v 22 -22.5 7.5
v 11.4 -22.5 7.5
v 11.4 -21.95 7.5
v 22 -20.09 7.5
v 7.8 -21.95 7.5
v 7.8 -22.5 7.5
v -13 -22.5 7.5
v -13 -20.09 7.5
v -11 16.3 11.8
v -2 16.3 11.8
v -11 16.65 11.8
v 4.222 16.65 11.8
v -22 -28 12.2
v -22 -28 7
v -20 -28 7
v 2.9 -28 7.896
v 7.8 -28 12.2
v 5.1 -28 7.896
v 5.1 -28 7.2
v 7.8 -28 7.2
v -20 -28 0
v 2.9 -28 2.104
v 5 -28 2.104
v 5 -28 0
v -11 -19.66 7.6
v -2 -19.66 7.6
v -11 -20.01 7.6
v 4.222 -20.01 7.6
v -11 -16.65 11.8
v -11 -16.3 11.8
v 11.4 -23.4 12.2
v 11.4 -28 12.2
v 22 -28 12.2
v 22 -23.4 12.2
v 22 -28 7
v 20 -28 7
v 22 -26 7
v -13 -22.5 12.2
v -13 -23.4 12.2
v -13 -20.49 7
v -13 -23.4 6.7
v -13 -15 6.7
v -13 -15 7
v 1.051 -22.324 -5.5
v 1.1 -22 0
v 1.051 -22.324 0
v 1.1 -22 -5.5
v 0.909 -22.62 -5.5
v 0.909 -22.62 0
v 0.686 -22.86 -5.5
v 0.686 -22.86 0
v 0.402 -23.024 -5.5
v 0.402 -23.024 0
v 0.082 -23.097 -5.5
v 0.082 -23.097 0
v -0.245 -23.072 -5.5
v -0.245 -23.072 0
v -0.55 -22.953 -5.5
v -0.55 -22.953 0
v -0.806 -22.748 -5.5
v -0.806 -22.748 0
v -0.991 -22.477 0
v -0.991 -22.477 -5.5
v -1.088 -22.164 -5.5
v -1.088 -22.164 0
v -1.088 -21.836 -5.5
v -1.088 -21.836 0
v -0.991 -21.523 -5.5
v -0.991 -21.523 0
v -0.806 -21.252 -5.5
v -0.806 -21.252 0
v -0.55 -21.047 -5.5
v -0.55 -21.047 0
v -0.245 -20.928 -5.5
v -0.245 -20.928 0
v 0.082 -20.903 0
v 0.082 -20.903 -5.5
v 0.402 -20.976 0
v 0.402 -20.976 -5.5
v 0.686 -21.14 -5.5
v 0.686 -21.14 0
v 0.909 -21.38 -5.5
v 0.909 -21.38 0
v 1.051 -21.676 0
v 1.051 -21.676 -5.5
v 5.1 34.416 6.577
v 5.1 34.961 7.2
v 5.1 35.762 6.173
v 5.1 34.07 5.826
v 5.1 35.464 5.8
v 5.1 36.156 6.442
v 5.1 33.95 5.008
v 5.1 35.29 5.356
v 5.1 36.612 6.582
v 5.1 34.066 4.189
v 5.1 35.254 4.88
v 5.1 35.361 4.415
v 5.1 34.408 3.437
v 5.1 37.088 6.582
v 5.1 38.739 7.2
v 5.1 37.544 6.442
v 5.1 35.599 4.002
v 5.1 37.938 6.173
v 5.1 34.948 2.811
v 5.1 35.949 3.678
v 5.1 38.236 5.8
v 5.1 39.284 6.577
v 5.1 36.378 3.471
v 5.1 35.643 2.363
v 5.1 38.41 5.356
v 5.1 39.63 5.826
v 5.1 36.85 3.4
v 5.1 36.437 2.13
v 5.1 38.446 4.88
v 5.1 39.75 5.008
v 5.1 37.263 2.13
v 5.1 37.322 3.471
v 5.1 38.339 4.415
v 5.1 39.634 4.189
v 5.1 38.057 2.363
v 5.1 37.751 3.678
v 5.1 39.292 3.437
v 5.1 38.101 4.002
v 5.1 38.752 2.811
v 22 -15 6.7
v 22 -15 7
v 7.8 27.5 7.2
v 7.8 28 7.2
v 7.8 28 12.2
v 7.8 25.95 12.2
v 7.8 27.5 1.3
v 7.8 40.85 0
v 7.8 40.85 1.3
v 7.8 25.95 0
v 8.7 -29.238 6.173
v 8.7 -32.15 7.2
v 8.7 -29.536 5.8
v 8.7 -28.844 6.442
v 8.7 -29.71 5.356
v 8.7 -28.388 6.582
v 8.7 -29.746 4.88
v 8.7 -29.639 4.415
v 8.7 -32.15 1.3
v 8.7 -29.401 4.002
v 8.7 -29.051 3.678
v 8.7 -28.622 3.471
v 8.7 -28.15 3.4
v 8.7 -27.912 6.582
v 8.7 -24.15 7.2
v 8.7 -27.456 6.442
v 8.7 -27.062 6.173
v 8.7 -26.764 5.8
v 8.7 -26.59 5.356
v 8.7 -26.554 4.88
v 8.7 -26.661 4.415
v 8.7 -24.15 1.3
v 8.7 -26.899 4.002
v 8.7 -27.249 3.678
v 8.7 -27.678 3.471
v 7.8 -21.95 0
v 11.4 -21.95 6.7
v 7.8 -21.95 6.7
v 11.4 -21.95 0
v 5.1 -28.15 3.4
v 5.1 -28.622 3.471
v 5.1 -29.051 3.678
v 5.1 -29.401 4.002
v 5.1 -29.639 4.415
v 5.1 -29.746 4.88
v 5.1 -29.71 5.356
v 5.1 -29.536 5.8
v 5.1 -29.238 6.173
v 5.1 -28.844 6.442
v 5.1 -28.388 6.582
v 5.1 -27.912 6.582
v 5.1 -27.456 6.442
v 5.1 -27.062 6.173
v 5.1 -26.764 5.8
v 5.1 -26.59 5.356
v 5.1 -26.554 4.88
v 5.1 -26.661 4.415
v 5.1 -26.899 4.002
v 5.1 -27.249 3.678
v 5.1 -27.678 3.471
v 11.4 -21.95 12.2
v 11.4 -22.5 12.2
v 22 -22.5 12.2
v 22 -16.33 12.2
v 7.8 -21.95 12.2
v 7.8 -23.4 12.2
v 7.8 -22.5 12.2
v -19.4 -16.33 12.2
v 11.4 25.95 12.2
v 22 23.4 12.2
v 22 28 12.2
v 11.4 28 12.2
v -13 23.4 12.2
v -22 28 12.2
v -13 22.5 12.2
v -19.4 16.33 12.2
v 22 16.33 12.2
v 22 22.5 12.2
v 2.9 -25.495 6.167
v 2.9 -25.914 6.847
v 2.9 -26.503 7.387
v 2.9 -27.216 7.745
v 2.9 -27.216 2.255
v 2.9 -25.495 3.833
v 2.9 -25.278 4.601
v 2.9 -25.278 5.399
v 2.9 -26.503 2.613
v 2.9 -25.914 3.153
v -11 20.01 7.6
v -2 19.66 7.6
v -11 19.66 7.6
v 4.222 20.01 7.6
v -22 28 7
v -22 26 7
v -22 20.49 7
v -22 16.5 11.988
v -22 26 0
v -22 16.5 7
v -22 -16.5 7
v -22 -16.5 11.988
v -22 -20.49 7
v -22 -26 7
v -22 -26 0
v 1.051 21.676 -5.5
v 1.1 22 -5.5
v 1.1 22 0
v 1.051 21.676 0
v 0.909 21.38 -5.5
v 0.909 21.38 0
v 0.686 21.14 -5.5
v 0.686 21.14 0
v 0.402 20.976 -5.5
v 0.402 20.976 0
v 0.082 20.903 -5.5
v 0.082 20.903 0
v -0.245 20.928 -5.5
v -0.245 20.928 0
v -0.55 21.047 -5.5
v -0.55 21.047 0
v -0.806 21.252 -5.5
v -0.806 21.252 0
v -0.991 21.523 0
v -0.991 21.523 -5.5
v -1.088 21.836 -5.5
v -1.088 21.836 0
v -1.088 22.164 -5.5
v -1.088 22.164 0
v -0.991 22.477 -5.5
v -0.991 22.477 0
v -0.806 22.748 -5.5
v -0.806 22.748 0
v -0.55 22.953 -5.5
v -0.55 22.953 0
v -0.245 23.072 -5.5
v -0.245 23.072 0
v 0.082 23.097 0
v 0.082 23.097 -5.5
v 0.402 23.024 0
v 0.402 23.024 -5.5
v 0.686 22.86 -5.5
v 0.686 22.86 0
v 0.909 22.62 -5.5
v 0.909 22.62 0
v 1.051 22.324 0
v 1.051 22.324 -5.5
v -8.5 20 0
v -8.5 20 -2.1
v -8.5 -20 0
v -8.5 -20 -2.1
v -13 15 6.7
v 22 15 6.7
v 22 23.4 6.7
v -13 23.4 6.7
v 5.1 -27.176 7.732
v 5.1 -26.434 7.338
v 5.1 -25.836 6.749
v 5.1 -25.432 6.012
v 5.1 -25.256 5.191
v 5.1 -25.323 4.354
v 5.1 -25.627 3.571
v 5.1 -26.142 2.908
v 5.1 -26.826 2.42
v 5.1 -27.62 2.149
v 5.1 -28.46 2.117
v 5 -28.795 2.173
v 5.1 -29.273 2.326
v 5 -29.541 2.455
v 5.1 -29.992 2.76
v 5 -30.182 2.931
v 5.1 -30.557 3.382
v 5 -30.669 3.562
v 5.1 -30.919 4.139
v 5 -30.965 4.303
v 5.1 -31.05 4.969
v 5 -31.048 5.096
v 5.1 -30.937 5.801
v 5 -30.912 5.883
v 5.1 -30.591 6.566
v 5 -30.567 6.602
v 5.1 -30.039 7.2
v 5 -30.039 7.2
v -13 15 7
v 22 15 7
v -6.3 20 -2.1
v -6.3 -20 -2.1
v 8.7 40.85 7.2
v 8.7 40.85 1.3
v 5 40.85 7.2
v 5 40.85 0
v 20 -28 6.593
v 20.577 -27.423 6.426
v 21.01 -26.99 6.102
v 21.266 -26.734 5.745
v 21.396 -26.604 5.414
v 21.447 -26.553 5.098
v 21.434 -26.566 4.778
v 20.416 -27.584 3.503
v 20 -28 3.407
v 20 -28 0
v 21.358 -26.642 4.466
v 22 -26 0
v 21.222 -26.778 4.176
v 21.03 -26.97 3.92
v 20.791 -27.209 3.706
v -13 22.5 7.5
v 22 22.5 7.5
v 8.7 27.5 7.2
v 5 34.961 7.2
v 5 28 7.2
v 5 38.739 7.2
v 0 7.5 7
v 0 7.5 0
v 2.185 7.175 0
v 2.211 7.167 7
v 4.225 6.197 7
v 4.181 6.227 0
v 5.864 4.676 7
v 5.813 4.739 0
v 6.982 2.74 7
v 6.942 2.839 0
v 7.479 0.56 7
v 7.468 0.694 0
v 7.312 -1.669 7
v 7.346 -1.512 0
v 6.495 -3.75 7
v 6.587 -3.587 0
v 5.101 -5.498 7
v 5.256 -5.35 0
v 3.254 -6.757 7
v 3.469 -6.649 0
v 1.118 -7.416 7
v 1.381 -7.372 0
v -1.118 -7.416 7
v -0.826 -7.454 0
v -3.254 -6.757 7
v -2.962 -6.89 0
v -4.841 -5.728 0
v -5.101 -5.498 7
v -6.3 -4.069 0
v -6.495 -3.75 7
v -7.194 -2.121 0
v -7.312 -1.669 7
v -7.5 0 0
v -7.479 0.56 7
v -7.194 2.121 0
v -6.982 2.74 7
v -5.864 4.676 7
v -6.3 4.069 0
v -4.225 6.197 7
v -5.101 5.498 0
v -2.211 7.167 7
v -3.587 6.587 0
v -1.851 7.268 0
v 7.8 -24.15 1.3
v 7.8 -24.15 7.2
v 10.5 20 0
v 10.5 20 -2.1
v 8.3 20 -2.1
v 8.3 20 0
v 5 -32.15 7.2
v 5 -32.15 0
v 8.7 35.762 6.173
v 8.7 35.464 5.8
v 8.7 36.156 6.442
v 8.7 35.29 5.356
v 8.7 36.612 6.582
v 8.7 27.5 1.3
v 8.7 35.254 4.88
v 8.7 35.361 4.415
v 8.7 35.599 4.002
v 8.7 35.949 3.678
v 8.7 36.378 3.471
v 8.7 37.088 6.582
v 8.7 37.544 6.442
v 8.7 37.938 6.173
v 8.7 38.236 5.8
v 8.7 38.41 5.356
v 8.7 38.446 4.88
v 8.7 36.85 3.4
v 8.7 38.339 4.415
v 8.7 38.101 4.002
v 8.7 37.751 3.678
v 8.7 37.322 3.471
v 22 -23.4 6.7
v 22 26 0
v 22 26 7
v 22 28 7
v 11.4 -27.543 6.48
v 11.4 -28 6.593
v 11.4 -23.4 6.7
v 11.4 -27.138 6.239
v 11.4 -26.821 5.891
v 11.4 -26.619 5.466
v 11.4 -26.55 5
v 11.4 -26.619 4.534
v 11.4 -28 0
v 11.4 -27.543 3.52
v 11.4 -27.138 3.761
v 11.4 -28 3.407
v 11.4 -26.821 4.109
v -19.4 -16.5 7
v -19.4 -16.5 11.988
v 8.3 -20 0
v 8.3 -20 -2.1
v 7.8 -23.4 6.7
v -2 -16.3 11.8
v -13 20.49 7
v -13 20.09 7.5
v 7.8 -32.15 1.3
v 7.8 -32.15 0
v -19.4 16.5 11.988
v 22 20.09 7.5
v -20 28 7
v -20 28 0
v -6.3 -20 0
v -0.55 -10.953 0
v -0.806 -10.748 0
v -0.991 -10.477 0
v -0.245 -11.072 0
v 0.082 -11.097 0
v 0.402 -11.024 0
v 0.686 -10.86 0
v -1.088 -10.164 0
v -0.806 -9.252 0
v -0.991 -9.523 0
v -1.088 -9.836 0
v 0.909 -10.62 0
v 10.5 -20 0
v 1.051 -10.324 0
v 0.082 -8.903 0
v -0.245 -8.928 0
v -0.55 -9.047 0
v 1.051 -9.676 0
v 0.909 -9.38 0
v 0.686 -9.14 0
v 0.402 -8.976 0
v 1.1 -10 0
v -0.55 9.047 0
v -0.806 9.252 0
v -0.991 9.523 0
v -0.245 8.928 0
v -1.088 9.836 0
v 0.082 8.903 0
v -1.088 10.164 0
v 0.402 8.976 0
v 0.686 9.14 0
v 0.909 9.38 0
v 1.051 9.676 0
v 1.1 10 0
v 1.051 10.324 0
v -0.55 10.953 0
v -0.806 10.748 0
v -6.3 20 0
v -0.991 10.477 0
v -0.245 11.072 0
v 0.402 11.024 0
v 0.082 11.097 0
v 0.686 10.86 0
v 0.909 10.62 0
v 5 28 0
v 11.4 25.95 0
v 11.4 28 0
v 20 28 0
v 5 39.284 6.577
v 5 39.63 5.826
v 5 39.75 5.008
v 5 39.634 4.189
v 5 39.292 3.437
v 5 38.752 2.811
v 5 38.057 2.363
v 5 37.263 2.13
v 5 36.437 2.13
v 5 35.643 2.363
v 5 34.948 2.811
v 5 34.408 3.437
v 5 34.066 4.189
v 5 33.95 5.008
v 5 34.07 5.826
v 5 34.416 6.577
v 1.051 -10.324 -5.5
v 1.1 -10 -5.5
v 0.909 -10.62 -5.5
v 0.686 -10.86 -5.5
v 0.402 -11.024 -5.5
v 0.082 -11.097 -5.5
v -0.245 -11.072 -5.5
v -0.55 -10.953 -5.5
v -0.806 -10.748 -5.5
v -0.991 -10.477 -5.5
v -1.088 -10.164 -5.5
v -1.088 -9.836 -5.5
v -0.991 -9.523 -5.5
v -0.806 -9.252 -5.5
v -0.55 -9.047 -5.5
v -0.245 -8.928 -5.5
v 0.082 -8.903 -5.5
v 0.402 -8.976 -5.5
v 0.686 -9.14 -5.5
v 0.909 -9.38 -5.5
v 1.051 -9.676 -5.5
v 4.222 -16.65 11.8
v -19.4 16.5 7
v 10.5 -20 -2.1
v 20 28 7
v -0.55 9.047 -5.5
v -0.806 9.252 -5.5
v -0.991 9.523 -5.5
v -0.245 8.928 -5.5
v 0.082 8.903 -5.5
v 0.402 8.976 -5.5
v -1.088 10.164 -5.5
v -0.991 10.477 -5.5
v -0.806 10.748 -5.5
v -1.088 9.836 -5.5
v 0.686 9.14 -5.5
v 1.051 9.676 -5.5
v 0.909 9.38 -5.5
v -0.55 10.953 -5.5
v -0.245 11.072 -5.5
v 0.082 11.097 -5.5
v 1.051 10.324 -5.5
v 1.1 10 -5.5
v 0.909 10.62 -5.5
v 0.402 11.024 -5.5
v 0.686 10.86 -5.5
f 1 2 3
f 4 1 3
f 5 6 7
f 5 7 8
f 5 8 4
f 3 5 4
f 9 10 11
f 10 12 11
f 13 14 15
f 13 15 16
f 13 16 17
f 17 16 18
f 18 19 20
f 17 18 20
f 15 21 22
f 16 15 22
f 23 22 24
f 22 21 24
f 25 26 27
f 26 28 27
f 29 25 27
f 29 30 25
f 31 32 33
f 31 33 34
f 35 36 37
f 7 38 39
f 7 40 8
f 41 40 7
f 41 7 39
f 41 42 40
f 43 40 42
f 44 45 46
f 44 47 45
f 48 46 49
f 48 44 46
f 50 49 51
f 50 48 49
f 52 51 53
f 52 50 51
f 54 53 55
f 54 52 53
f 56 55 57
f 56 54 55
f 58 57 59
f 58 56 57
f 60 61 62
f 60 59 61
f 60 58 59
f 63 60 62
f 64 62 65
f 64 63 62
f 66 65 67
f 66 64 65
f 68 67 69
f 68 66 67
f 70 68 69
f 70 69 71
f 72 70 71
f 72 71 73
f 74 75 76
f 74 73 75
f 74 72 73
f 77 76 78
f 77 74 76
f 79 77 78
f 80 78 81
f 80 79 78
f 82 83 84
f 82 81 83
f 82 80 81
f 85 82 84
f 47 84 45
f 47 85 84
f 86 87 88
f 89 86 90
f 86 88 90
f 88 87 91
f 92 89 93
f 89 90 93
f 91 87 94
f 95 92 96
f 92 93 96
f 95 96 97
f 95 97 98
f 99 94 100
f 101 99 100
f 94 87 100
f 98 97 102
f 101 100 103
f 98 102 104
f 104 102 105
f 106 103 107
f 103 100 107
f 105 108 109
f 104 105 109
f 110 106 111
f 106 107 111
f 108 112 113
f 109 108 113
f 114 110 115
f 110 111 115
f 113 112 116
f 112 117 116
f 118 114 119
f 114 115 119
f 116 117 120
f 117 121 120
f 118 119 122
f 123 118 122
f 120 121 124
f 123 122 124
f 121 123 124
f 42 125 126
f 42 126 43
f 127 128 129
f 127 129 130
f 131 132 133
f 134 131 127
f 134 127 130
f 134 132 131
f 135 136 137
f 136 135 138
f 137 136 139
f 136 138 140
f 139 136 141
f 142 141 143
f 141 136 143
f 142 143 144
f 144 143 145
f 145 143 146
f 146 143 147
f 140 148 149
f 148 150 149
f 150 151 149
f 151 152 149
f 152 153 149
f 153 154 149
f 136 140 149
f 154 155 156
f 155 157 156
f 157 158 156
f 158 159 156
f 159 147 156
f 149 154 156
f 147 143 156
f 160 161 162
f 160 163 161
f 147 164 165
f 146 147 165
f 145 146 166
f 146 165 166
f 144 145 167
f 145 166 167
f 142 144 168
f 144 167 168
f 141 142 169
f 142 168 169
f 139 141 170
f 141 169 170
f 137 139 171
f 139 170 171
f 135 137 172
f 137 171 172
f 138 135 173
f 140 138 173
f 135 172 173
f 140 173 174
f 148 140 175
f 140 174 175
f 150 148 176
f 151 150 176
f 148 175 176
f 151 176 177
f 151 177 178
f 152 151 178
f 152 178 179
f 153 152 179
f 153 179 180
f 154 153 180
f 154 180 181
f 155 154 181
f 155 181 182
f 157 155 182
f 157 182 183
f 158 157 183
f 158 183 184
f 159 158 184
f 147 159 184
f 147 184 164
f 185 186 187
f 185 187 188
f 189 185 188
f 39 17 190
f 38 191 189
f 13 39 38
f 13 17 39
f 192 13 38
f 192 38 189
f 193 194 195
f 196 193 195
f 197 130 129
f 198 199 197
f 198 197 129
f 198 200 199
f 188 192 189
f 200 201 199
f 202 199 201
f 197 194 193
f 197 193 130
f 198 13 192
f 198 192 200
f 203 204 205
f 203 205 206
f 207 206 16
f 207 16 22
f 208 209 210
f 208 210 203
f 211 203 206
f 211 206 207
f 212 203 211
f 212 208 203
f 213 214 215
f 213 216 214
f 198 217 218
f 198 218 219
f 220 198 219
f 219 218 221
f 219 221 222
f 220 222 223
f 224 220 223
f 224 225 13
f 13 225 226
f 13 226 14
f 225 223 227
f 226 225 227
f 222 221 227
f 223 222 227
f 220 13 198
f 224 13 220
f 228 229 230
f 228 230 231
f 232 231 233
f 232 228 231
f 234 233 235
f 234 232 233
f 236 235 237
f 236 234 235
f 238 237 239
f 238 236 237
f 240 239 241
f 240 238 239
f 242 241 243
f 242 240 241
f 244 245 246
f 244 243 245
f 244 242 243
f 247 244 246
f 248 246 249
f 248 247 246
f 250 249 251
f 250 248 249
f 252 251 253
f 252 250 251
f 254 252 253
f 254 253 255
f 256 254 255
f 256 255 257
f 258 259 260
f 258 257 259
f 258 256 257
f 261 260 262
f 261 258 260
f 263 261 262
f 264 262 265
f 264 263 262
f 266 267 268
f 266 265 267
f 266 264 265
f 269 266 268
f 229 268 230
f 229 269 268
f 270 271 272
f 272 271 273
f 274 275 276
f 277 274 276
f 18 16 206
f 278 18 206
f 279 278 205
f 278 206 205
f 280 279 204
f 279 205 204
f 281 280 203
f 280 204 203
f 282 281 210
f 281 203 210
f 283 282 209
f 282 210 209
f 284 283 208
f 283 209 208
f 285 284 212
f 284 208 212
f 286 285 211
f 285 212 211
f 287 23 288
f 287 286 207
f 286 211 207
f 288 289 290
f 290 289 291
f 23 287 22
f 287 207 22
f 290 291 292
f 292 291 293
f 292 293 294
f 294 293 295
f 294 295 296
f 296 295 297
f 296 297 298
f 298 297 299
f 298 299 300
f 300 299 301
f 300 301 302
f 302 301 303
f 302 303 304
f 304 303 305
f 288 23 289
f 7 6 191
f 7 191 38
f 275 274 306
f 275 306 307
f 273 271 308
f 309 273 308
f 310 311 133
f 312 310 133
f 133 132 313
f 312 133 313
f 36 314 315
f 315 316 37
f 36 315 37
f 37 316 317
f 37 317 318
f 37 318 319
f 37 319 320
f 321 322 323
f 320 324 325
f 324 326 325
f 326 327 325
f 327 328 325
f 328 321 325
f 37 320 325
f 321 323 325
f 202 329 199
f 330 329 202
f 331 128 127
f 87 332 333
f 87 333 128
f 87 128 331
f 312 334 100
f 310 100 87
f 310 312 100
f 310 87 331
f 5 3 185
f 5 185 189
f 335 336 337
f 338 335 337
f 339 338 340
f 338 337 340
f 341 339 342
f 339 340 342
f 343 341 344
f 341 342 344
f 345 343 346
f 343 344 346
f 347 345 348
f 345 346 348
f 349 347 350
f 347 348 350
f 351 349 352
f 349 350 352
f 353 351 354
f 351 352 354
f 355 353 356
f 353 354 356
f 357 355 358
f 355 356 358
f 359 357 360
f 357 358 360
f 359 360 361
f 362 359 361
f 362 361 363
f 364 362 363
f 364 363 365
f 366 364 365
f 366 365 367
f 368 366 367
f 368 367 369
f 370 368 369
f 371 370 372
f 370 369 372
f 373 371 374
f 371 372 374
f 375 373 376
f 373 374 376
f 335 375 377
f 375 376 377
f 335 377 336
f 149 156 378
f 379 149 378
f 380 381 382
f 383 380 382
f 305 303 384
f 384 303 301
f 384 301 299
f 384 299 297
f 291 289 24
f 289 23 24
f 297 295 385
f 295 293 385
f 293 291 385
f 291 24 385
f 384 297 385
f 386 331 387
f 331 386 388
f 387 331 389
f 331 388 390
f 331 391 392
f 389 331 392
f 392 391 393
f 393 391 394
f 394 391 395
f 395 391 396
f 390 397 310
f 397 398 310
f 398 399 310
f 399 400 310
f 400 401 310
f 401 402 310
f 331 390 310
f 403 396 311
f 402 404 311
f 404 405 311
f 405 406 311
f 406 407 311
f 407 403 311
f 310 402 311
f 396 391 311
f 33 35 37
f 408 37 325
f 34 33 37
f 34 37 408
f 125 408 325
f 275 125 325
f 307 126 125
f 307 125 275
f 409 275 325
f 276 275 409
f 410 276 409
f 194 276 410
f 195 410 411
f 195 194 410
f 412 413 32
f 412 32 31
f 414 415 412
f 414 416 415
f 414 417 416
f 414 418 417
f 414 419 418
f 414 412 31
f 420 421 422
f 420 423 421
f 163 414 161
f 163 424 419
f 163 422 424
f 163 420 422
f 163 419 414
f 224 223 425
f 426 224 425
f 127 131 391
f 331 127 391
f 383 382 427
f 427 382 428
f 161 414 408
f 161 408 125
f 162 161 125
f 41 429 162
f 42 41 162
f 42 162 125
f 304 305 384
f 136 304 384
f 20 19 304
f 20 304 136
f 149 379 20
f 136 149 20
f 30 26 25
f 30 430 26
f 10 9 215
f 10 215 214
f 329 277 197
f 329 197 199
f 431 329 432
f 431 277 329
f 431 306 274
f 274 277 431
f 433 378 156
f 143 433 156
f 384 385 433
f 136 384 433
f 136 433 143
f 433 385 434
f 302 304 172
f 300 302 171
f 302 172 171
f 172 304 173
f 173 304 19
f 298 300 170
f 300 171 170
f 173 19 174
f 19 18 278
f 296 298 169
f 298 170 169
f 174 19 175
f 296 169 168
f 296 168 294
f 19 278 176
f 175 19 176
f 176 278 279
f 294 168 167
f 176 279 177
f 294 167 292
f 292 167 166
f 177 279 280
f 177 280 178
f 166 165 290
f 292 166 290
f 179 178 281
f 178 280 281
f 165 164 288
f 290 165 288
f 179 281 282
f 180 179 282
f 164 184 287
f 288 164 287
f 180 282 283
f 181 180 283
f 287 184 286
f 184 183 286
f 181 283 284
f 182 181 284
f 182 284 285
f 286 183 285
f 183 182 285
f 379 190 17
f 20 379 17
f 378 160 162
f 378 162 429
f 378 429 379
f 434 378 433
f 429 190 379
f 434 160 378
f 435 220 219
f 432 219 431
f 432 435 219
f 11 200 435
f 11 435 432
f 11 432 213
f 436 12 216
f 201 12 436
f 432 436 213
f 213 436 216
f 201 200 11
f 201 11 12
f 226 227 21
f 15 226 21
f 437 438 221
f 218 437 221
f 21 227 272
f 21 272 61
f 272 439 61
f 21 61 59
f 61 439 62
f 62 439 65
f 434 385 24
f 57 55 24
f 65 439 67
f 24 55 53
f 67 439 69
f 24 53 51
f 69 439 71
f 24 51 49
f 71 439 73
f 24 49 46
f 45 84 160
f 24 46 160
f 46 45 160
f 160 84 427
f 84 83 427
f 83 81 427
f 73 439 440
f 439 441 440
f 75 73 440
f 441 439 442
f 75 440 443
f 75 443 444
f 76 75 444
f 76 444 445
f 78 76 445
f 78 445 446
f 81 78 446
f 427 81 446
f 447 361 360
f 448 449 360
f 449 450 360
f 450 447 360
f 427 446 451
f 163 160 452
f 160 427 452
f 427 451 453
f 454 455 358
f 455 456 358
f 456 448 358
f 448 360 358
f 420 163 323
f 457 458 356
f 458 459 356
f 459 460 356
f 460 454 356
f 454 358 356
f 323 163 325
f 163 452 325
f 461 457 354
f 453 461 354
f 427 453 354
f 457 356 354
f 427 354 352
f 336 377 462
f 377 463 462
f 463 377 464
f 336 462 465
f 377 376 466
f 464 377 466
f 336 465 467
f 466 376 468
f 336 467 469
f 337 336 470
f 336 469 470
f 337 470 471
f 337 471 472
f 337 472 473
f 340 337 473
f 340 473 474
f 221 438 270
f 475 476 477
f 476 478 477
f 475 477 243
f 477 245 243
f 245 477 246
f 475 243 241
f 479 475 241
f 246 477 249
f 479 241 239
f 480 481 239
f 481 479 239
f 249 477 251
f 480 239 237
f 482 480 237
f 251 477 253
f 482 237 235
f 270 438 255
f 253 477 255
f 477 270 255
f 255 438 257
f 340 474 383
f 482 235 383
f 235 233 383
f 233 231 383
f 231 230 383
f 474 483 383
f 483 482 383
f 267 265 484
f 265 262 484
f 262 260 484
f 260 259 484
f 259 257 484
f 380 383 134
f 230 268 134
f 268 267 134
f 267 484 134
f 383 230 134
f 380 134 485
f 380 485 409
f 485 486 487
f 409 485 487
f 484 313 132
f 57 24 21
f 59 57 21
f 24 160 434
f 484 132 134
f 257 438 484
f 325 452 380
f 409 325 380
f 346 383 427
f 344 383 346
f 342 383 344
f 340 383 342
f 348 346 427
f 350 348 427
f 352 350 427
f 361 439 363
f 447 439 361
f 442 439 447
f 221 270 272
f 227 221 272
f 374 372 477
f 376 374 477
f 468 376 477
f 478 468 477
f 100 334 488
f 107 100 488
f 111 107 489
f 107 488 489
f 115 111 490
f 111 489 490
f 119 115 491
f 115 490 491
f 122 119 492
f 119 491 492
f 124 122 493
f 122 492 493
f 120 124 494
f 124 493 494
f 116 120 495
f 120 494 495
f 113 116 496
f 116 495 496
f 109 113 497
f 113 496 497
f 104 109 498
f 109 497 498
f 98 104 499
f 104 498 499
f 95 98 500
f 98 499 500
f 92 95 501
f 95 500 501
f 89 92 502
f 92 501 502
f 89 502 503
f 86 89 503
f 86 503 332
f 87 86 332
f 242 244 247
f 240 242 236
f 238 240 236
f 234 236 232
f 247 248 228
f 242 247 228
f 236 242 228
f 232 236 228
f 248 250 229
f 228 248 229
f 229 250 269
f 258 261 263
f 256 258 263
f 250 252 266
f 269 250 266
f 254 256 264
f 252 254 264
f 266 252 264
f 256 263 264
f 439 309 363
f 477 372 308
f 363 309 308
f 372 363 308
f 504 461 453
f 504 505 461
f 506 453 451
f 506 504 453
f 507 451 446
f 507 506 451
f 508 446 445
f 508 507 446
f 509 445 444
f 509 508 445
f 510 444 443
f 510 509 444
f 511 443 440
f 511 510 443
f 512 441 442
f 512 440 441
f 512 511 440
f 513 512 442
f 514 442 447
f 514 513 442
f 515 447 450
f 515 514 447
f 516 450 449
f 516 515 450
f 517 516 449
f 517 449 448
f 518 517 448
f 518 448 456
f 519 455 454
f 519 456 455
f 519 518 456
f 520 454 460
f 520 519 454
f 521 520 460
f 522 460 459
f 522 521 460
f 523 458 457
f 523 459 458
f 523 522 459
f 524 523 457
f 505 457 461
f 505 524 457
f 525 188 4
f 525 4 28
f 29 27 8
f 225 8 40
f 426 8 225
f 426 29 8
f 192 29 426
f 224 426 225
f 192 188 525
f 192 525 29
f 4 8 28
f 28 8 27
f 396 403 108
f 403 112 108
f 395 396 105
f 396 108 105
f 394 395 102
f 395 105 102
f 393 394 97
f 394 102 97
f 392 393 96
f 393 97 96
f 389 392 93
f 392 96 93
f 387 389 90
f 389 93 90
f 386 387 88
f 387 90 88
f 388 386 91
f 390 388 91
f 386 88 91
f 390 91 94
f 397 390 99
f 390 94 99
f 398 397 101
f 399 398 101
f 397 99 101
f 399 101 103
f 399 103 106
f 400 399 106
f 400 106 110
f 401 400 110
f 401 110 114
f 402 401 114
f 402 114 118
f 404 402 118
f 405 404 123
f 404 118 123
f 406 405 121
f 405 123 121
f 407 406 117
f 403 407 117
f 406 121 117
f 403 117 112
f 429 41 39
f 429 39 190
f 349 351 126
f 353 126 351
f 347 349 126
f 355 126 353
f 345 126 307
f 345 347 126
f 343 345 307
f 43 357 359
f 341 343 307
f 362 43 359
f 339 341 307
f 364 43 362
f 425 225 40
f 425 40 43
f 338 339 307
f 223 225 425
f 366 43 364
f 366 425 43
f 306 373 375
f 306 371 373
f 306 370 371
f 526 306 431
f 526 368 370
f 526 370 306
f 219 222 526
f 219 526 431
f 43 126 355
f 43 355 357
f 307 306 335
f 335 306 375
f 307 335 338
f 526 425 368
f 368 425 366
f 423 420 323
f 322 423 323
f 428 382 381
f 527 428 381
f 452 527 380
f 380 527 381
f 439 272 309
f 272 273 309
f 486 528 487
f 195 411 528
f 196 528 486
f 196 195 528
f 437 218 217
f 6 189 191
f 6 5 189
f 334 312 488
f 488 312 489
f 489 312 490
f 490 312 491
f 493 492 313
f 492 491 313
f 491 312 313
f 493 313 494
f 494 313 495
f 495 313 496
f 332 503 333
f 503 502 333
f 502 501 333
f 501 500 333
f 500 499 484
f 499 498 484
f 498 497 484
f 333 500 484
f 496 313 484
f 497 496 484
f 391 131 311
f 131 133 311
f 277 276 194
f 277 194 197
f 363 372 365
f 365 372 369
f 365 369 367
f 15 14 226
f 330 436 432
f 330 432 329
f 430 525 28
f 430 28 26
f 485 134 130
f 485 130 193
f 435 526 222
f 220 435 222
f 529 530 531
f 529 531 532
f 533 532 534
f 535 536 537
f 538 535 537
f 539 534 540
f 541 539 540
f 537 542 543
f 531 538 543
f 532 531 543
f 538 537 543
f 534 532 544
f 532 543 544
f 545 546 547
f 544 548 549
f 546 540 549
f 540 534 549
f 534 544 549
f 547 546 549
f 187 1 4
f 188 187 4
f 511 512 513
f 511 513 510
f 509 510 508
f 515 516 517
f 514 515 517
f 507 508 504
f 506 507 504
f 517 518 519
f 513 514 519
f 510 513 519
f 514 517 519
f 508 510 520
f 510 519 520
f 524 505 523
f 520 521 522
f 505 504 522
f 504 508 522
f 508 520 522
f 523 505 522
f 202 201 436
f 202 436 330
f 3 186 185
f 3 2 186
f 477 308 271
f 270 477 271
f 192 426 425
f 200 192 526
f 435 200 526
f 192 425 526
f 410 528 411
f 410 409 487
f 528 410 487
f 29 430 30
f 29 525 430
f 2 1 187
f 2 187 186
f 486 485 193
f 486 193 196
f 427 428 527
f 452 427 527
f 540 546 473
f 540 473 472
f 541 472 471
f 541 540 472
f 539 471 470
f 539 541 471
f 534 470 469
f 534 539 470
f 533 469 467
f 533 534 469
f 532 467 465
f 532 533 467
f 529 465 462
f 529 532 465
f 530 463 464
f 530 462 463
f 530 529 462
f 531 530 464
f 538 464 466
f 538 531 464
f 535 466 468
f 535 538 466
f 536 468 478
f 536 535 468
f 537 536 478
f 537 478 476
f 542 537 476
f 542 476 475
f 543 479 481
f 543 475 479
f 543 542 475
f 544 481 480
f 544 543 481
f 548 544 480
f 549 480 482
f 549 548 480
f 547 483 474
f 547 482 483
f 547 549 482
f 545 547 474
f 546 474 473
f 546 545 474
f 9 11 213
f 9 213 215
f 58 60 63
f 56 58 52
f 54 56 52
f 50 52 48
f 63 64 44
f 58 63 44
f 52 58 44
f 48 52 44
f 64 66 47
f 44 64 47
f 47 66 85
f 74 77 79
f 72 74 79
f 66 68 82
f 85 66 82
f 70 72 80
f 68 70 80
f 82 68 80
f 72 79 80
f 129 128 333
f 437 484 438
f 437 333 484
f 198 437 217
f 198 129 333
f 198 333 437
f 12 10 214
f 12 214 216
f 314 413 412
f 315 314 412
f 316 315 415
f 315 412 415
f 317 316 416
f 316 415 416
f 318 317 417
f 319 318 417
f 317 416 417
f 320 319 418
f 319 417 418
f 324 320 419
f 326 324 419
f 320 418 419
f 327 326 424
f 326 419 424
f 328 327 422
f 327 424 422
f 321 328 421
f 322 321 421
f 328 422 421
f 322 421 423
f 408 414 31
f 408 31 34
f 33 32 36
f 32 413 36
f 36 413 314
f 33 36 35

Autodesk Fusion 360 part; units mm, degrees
ref_plane "工作平面1" through (0, 0, 0) normal (0, 0, 1) x (1, 0, 0)
sketch "草图1" plane through (0, 0, 0) normal (0, 0, 1) x (1, 0, 0)
  line L0 (-26, -22) -> (26, -22)
  line L1 (26, -22) -> (28, -20)
  line L2 (28, -20) -> (28, 20)
  line L3 (28, 20) -> (26, 22)
  line L4 (26, 22) -> (-26, 22)
  line L5 (-26, 22) -> (-28, 20)
  line L6 (-28, 20) -> (-28, -20)
  line L7 (-28, -20) -> (-26, -22)
extrude "56 x 44 x 7 platform" add sketch "草图1" along normal blind 7
ref_plane "工作平面2" through (0, 0, 7) normal (0, 0, 1) x (1, 0, 0)
sketch "草图2" plane through (0, 0, 7) normal (0, 0, 1) x (1, 0, 0)
  line L0 (-28, -22) -> (-20.49, -22)
  line L1 (-20.49, -22) -> (-20.49, 22)
  line L2 (-20.49, 22) -> (-28, 22)
  line L3 (-28, 22) -> (-28, -22)
ref_plane "工作平面3" through (0, 0, 12.2) normal (0, 0, 1) x (1, 0, 0)
sketch "草图3" plane through (0, 0, 12.2) normal (0, 0, 1) x (1, 0, 0)
  line L0 (-28, -22) -> (-16.33, -22)
  line L1 (-16.33, -22) -> (-16.33, 22)
  line L2 (-16.33, 22) -> (-28, 22)
  line L3 (-28, 22) -> (-28, -22)
loft "Dovetail retaining rail 0.8 to 1 -1" add profiles "草图2", "草图3" section 1 section 2
ref_plane "工作平面4" through (0, 0, 6.7) normal (0, 0, 1) x (1, 0, 0)
sketch "草图4" plane through (0, 0, 6.7) normal (0, 0, 1) x (1, 0, 0)
  line L0 (-23.4, -22) -> (-22.5, -22)
  line L1 (-22.5, -22) -> (-22.5, 13)
  line L2 (-22.5, 13) -> (-23.4, 13)
  line L3 (-23.4, 13) -> (-23.4, -22)
extrude "0.9 mm longitudinal flexure slot -1" cut sketch "草图4" along normal blind 5.8
ref_plane "工作平面5" through (0, 0, 6.7) normal (0, 0, 1) x (1, 0, 0)
sketch "草图5" plane through (0, 0, 6.7) normal (0, 0, 1) x (1, 0, 0)
  line L0 (-22.5, -22) -> (-15, -22)
  line L1 (-15, -22) -> (-15, 13)
  line L2 (-15, 13) -> (-22.5, 13)
  line L3 (-22.5, 13) -> (-22.5, -22)
extrude "0.8 mm flexure underside relief -1" cut sketch "草图5" along normal blind 0.8
ref_plane "工作平面6" through (0, 0, 7.6) normal (0, 0, 1) x (1, 0, 0)
sketch "草图6" plane through (0, 0, 7.6) normal (0, 0, 1) x (1, 0, 0)
  line L0 (-20.21, -6) -> (-20.21, 11)
  line L1 (-20.21, 11) -> (-19.66, 11)
  line L2 (-19.66, 11) -> (-19.66, 2)
  line L3 (-19.66, 2) -> (-20.11, -6)
  line L4 (-20.11, -6) -> (-20.21, -6)
ref_plane "工作平面7" through (0, 0, 11.8) normal (0, 0, 1) x (1, 0, 0)
sketch "草图7" plane through (0, 0, 11.8) normal (0, 0, 1) x (1, 0, 0)
  line L0 (-16.85, -6) -> (-16.85, 11)
  line L1 (-16.85, 11) -> (-16.3, 11)
  line L2 (-16.3, 11) -> (-16.3, 2)
  line L3 (-16.3, 2) -> (-16.75, -6)
  line L4 (-16.75, -6) -> (-16.85, -6)
loft "Tapered friction contact rib -1" add profiles "草图6", "草图7" section 1 section 2
ref_plane "工作平面8" through (0, 0, 7) normal (0, 0, 1) x (1, 0, 0)
sketch "草图8" plane through (0, 0, 7) normal (0, 0, 1) x (1, 0, 0)
  line L0 (20.49, -22) -> (28, -22)
  line L1 (28, -22) -> (28, 22)
  line L2 (28, 22) -> (20.49, 22)
  line L3 (20.49, 22) -> (20.49, -22)
ref_plane "工作平面9" through (0, 0, 12.2) normal (0, 0, 1) x (1, 0, 0)
sketch "草图9" plane through (0, 0, 12.2) normal (0, 0, 1) x (1, 0, 0)
  line L0 (16.33, -22) -> (28, -22)
  line L1 (28, -22) -> (28, 22)
  line L2 (28, 22) -> (16.33, 22)
  line L3 (16.33, 22) -> (16.33, -22)
loft "Dovetail retaining rail 0.8 to 1 1" add profiles "草图8", "草图9" section 1 section 2
ref_plane "工作平面10" through (0, 0, 6.7) normal (0, 0, 1) x (1, 0, 0)
sketch "草图10" plane through (0, 0, 6.7) normal (0, 0, 1) x (1, 0, 0)
  line L0 (22.5, -22) -> (23.4, -22)
  line L1 (23.4, -22) -> (23.4, 13)
  line L2 (23.4, 13) -> (22.5, 13)
  line L3 (22.5, 13) -> (22.5, -22)
extrude "0.9 mm longitudinal flexure slot 1" cut sketch "草图10" along normal blind 5.8
ref_plane "工作平面11" through (0, 0, 6.7) normal (0, 0, 1) x (1, 0, 0)
sketch "草图11" plane through (0, 0, 6.7) normal (0, 0, 1) x (1, 0, 0)
  line L0 (15, -22) -> (22.5, -22)
  line L1 (22.5, -22) -> (22.5, 13)
  line L2 (22.5, 13) -> (15, 13)
  line L3 (15, 13) -> (15, -22)
extrude "0.8 mm flexure underside relief 1" cut sketch "草图11" along normal blind 0.8
ref_plane "工作平面12" through (0, 0, 7.6) normal (0, 0, 1) x (1, 0, 0)
sketch "草图12" plane through (0, 0, 7.6) normal (0, 0, 1) x (1, 0, 0)
  line L0 (20.21, -6) -> (20.21, 11)
  line L1 (20.21, 11) -> (19.66, 11)
  line L2 (19.66, 11) -> (19.66, 2)
  line L3 (19.66, 2) -> (20.11, -6)
  line L4 (20.11, -6) -> (20.21, -6)
ref_plane "工作平面13" through (0, 0, 11.8) normal (0, 0, 1) x (1, 0, 0)
sketch "草图13" plane through (0, 0, 11.8) normal (0, 0, 1) x (1, 0, 0)
  line L0 (16.85, -6) -> (16.85, 11)
  line L1 (16.85, 11) -> (16.3, 11)
  line L2 (16.3, 11) -> (16.3, 2)
  line L3 (16.3, 2) -> (16.75, -6)
  line L4 (16.75, -6) -> (16.85, -6)
loft "Tapered friction contact rib 1" add profiles "草图12", "草图13" section 1 section 2
ref_plane "工作平面14" through (0, 0, 7) normal (0, 0, 1) x (1, 0, 0)
sketch "草图14" plane through (0, 0, 7) normal (0, 0, 1) x (1, 0, 0)
  line L0 (-16.5, 19.4) -> (16.5, 19.4)
  line L1 (16.5, 19.4) -> (16.5, 22)
  line L2 (16.5, 22) -> (-16.5, 22)
  line L3 (-16.5, 22) -> (-16.5, 19.4)
extrude "Closed insertion end stop" add sketch "草图14" along normal blind 5.2
ref_plane "工作平面15" through (0, 0, 0) normal (0, 0, 1) x (1, 0, 0)
sketch "草图15" plane through (0, 0, 0) normal (0, 0, 1) x (1, 0, 0)
  circle A0 centre (0, 0) radius 7.5
extrude "15 mm screw and driver access" cut sketch "草图15" along normal blind 7
move_body "Align camera long edge with gimbal arm - 90 degrees" bodies 1 to x (0, 1, 0) y (-1, 0, 0) z (0, 0, 1) at (0, 0, 0)
ref_plane "工作平面16" through (0, 0, 0) normal (0, 0, 1) x (1, 0, 0)
sketch "草图16" plane through (0, 0, 0) normal (0, 0, 1) x (1, 0, 0)
  line L0 (7.8, -28) -> (11.4, -28)
  line L1 (11.4, -28) -> (11.4, -21.95)
  line L2 (11.4, -21.95) -> (7.8, -21.95)
  line L3 (7.8, -21.95) -> (7.8, -28)
extrude "Clear original raised tab and root fillet" cut sketch "草图16" along normal blind 12.3
ref_plane "工作平面17" through (0, 0, 0) normal (0, 0, 1) x (1, 0, 0)
sketch "草图17" plane through (0, 0, 0) normal (0, 0, 1) x (1, 0, 0)
  line L0 (7.8, 25.95) -> (11.4, 25.95)
  line L1 (11.4, 25.95) -> (11.4, 28)
  line L2 (11.4, 28) -> (7.8, 28)
  line L3 (7.8, 28) -> (7.8, 25.95)
extrude "Clear original raised tab and root fillet (1)" cut sketch "草图17" along normal blind 12.3
ref_plane "工作平面18" through (0, 0, -2.1) normal (0, 0, 1) x (1, 0, 0)
sketch "草图18" plane through (0, 0, -2.1) normal (0, 0, 1) x (1, 0, 0)
  line L0 (-8.5, -20) -> (-6.3, -20)
  line L1 (-6.3, -20) -> (-6.3, 20)
  line L2 (-6.3, 20) -> (-8.5, 20)
  line L3 (-8.5, 20) -> (-8.5, -20)
extrude "Arm lateral locating shoulder" add sketch "草图18" along normal blind 2.1
ref_plane "工作平面19" through (0, 0, -2.1) normal (0, 0, 1) x (1, 0, 0)
sketch "草图19" plane through (0, 0, -2.1) normal (0, 0, 1) x (1, 0, 0)
  line L0 (8.3, -20) -> (10.5, -20)
  line L1 (10.5, -20) -> (10.5, 20)
  line L2 (10.5, 20) -> (8.3, 20)
  line L3 (8.3, 20) -> (8.3, -20)
extrude "Arm lateral locating shoulder (1)" add sketch "草图19" along normal blind 2.1
ref_plane "工作平面20" through (0, 0, -5.5) normal (0, 0, 1) x (1, 0, 0)
sketch "草图20" plane through (0, 0, -5.5) normal (0, 0, 1) x (1, 0, 0)
  circle A0 centre (0, -22) radius 1.1
extrude "Reinforced 2.2 x 5.5 mm heat stake pin at arm y -22" add sketch "草图20" along normal blind 5.5
ref_plane "工作平面21" through (0, 0, -5.5) normal (0, 0, 1) x (1, 0, 0)
sketch "草图21" plane through (0, 0, -5.5) normal (0, 0, 1) x (1, 0, 0)
  circle A0 centre (0, -10) radius 1.1
extrude "Reinforced 2.2 x 5.5 mm heat stake pin at arm y -10" add sketch "草图21" along normal blind 5.5
ref_plane "工作平面22" through (0, 0, -5.5) normal (0, 0, 1) x (1, 0, 0)
sketch "草图22" plane through (0, 0, -5.5) normal (0, 0, 1) x (1, 0, 0)
  circle A0 centre (0, 10) radius 1.1
extrude "Reinforced 2.2 x 5.5 mm heat stake pin at arm y 10" add sketch "草图22" along normal blind 5.5
ref_plane "工作平面23" through (0, 0, -5.5) normal (0, 0, 1) x (1, 0, 0)
sketch "草图23" plane through (0, 0, -5.5) normal (0, 0, 1) x (1, 0, 0)
  circle A0 centre (0, 22) radius 1.1
extrude "Reinforced 2.2 x 5.5 mm heat stake pin at arm y 22" add sketch "草图23" along normal blind 5.5
ref_plane "工作平面24" through (0, 0, 0) normal (0, 0, 1) x (1, 0, 0)
sketch "草图24" plane through (0, 0, 0) normal (0, 0, 1) x (1, 0, 0)
  line L0 (5, -32.15) -> (8.7, -32.15)
  line L1 (8.7, -32.15) -> (8.7, -24.15)
  line L2 (8.7, -24.15) -> (5, -24.15)
  line L3 (5, -24.15) -> (5, -32.15)
extrude "Ear for original 3.2 mm side hole at arm y -28.15" add sketch "草图24" along normal blind 7.2
ref_plane "工作平面25" through (0, 0, 0) normal (0, 0, 1) x (1, 0, 0)
sketch "草图25" plane through (0, 0, 0) normal (0, 0, 1) x (1, 0, 0)
  line L0 (7.8, -32.15) -> (8.9, -32.15)
  line L1 (8.9, -32.15) -> (8.9, -24.15)
  line L2 (8.9, -24.15) -> (7.8, -24.15)
  line L3 (7.8, -24.15) -> (7.8, -32.15)
extrude "Ear relief around original arm root radius" cut sketch "草图25" along normal blind 1.3
ref_plane "工作平面26" through (4.9, 0, 0) normal (1, 0, 0) x (0, 1, 0)
sketch "草图26" plane through (4.9, 0, 0) normal (1, 0, 0) x (0, 0, -1)
  circle A0 centre (-5, -28.15) radius 1.6
extrude "Side rivet ear clearance" cut sketch "草图26" along normal blind 4
ref_plane "工作平面27" through (0, 0, 0) normal (0, 0, 1) x (1, 0, 0)
sketch "草图27" plane through (0, 0, 0) normal (0, 0, 1) x (1, 0, 0)
  line L0 (5, 27.5) -> (8.7, 27.5)
  line L1 (8.7, 27.5) -> (8.7, 40.85)
  line L2 (8.7, 40.85) -> (5, 40.85)
  line L3 (5, 40.85) -> (5, 27.5)
extrude "Ear for original 3.2 mm side hole at arm y 36.85" add sketch "草图27" along normal blind 7.2
ref_plane "工作平面28" through (0, 0, 0) normal (0, 0, 1) x (1, 0, 0)
sketch "草图28" plane through (0, 0, 0) normal (0, 0, 1) x (1, 0, 0)
  line L0 (7.8, 27.5) -> (8.9, 27.5)
  line L1 (8.9, 27.5) -> (8.9, 40.85)
  line L2 (8.9, 40.85) -> (7.8, 40.85)
  line L3 (7.8, 40.85) -> (7.8, 27.5)
extrude "Ear relief around original arm root radius (1)" cut sketch "草图28" along normal blind 1.3
ref_plane "工作平面29" through (4.9, 0, 0) normal (1, 0, 0) x (0, 1, 0)
sketch "草图29" plane through (4.9, 0, 0) normal (1, 0, 0) x (0, 0, -1)
  circle A0 centre (-5, 36.85) radius 1.6
extrude "Side rivet ear clearance (1)" cut sketch "草图29" along normal blind 4
ref_plane "工作平面30" through (4.9, 0, 0) normal (1, 0, 0) x (0, 1, 0)
sketch "草图30" plane through (4.9, 0, 0) normal (1, 0, 0) x (0, 0, -1)
  circle A0 centre (-5, -28.15) radius 1.6
extrude "Side rivet full passage clearance" cut sketch "草图30" along normal blind 20
ref_plane "工作平面31" through (2.9, 0, 0) normal (1, 0, 0) x (0, 1, 0)
sketch "草图31" plane through (2.9, 0, 0) normal (1, 0, 0) x (0, 0, -1)
  circle A0 centre (-5, -28.15) radius 2.9
extrude "Side rivet flange counterbore" cut sketch "草图31" along normal blind 2.2
ref_plane "工作平面32" through (4.9, 0, 0) normal (1, 0, 0) x (0, 1, 0)
sketch "草图32" plane through (4.9, 0, 0) normal (1, 0, 0) x (0, 0, -1)
  circle A0 centre (-5, 36.85) radius 1.6
ref_plane "工作平面33" through (2.9, 0, 0) normal (1, 0, 0) x (0, 1, 0)
sketch "草图33" plane through (2.9, 0, 0) normal (1, 0, 0) x (0, 0, -1)
  circle A0 centre (-5, 36.85) radius 2.9
extrude "Side rivet flange counterbore (1)" cut sketch "草图33" along normal blind 2.2
